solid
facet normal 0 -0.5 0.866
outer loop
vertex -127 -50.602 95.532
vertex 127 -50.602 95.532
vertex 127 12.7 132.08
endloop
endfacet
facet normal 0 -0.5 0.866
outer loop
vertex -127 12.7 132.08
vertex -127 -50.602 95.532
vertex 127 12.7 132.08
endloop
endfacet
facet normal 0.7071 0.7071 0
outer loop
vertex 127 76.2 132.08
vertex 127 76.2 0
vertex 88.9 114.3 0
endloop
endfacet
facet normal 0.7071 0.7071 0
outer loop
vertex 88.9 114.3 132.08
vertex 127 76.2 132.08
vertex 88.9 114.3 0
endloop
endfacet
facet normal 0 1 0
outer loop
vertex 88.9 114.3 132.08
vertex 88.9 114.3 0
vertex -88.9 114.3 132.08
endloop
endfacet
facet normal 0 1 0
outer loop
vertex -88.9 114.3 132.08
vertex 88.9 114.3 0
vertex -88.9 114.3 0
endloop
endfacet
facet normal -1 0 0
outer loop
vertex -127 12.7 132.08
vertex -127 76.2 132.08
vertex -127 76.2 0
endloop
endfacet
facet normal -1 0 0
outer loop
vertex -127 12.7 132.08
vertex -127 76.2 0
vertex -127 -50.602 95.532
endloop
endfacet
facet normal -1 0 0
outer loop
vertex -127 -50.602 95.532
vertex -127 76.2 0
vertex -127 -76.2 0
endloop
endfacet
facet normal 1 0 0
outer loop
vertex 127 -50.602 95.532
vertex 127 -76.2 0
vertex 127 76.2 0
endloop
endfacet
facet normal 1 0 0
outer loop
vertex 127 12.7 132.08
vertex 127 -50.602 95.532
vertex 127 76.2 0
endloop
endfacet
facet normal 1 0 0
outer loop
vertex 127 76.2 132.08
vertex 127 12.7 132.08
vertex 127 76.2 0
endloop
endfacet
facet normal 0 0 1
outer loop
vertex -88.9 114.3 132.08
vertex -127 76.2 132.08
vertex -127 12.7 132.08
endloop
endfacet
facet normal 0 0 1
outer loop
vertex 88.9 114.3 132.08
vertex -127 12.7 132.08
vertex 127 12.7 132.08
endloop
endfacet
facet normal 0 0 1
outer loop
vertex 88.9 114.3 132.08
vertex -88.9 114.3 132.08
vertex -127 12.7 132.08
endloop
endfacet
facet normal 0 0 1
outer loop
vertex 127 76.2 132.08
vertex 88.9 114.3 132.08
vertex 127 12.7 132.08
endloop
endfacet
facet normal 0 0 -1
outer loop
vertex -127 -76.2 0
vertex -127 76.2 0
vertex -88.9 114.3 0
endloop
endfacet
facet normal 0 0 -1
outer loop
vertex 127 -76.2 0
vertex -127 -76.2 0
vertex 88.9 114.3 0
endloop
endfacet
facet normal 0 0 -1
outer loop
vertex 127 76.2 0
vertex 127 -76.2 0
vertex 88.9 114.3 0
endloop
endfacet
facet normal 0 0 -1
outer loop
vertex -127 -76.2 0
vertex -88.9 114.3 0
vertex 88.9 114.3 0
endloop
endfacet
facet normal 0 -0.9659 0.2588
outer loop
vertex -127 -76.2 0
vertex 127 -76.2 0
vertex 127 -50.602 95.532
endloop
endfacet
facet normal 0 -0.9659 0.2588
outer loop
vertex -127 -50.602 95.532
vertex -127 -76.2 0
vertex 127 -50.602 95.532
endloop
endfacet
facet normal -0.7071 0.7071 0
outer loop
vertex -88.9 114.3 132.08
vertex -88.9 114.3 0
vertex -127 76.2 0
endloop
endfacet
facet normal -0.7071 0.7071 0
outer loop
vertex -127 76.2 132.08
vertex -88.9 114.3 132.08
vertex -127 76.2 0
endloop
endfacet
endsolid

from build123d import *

# Parameters (mm, degrees)
F1_DEPTH = 132.08
F3_DEPTH = 254.001
F5_DEPTH = 254.001


with BuildPart() as f1:
    # F0 (on Top) → F1 (new body)
    with BuildSketch(Plane.XY):
        Polygon((-127, 76.2), (-127, -76.2), (127, -76.2), (127, 76.2), (88.9, 114.3), (-88.9, 114.3), align=None)
    extrude(amount=F1_DEPTH)

    # F2 (on face) → F3 (cut, through all)
    with BuildSketch(Plane.YZ.offset(127)):
        Polygon((-76.2, 132.08), (-76.2, 0), (-40.809271, 132.08), align=None)
    extrude(amount=-F3_DEPTH, mode=Mode.SUBTRACT)

    # F4 (on face) → F5 (cut, through all)
    with BuildSketch(Plane.YZ.offset(127)):
        Polygon((12.7, 132.08), (-76.2, 132.08), (-76.2, 80.753561), align=None)
    extrude(amount=-F5_DEPTH, mode=Mode.SUBTRACT)


solid = f1.part
